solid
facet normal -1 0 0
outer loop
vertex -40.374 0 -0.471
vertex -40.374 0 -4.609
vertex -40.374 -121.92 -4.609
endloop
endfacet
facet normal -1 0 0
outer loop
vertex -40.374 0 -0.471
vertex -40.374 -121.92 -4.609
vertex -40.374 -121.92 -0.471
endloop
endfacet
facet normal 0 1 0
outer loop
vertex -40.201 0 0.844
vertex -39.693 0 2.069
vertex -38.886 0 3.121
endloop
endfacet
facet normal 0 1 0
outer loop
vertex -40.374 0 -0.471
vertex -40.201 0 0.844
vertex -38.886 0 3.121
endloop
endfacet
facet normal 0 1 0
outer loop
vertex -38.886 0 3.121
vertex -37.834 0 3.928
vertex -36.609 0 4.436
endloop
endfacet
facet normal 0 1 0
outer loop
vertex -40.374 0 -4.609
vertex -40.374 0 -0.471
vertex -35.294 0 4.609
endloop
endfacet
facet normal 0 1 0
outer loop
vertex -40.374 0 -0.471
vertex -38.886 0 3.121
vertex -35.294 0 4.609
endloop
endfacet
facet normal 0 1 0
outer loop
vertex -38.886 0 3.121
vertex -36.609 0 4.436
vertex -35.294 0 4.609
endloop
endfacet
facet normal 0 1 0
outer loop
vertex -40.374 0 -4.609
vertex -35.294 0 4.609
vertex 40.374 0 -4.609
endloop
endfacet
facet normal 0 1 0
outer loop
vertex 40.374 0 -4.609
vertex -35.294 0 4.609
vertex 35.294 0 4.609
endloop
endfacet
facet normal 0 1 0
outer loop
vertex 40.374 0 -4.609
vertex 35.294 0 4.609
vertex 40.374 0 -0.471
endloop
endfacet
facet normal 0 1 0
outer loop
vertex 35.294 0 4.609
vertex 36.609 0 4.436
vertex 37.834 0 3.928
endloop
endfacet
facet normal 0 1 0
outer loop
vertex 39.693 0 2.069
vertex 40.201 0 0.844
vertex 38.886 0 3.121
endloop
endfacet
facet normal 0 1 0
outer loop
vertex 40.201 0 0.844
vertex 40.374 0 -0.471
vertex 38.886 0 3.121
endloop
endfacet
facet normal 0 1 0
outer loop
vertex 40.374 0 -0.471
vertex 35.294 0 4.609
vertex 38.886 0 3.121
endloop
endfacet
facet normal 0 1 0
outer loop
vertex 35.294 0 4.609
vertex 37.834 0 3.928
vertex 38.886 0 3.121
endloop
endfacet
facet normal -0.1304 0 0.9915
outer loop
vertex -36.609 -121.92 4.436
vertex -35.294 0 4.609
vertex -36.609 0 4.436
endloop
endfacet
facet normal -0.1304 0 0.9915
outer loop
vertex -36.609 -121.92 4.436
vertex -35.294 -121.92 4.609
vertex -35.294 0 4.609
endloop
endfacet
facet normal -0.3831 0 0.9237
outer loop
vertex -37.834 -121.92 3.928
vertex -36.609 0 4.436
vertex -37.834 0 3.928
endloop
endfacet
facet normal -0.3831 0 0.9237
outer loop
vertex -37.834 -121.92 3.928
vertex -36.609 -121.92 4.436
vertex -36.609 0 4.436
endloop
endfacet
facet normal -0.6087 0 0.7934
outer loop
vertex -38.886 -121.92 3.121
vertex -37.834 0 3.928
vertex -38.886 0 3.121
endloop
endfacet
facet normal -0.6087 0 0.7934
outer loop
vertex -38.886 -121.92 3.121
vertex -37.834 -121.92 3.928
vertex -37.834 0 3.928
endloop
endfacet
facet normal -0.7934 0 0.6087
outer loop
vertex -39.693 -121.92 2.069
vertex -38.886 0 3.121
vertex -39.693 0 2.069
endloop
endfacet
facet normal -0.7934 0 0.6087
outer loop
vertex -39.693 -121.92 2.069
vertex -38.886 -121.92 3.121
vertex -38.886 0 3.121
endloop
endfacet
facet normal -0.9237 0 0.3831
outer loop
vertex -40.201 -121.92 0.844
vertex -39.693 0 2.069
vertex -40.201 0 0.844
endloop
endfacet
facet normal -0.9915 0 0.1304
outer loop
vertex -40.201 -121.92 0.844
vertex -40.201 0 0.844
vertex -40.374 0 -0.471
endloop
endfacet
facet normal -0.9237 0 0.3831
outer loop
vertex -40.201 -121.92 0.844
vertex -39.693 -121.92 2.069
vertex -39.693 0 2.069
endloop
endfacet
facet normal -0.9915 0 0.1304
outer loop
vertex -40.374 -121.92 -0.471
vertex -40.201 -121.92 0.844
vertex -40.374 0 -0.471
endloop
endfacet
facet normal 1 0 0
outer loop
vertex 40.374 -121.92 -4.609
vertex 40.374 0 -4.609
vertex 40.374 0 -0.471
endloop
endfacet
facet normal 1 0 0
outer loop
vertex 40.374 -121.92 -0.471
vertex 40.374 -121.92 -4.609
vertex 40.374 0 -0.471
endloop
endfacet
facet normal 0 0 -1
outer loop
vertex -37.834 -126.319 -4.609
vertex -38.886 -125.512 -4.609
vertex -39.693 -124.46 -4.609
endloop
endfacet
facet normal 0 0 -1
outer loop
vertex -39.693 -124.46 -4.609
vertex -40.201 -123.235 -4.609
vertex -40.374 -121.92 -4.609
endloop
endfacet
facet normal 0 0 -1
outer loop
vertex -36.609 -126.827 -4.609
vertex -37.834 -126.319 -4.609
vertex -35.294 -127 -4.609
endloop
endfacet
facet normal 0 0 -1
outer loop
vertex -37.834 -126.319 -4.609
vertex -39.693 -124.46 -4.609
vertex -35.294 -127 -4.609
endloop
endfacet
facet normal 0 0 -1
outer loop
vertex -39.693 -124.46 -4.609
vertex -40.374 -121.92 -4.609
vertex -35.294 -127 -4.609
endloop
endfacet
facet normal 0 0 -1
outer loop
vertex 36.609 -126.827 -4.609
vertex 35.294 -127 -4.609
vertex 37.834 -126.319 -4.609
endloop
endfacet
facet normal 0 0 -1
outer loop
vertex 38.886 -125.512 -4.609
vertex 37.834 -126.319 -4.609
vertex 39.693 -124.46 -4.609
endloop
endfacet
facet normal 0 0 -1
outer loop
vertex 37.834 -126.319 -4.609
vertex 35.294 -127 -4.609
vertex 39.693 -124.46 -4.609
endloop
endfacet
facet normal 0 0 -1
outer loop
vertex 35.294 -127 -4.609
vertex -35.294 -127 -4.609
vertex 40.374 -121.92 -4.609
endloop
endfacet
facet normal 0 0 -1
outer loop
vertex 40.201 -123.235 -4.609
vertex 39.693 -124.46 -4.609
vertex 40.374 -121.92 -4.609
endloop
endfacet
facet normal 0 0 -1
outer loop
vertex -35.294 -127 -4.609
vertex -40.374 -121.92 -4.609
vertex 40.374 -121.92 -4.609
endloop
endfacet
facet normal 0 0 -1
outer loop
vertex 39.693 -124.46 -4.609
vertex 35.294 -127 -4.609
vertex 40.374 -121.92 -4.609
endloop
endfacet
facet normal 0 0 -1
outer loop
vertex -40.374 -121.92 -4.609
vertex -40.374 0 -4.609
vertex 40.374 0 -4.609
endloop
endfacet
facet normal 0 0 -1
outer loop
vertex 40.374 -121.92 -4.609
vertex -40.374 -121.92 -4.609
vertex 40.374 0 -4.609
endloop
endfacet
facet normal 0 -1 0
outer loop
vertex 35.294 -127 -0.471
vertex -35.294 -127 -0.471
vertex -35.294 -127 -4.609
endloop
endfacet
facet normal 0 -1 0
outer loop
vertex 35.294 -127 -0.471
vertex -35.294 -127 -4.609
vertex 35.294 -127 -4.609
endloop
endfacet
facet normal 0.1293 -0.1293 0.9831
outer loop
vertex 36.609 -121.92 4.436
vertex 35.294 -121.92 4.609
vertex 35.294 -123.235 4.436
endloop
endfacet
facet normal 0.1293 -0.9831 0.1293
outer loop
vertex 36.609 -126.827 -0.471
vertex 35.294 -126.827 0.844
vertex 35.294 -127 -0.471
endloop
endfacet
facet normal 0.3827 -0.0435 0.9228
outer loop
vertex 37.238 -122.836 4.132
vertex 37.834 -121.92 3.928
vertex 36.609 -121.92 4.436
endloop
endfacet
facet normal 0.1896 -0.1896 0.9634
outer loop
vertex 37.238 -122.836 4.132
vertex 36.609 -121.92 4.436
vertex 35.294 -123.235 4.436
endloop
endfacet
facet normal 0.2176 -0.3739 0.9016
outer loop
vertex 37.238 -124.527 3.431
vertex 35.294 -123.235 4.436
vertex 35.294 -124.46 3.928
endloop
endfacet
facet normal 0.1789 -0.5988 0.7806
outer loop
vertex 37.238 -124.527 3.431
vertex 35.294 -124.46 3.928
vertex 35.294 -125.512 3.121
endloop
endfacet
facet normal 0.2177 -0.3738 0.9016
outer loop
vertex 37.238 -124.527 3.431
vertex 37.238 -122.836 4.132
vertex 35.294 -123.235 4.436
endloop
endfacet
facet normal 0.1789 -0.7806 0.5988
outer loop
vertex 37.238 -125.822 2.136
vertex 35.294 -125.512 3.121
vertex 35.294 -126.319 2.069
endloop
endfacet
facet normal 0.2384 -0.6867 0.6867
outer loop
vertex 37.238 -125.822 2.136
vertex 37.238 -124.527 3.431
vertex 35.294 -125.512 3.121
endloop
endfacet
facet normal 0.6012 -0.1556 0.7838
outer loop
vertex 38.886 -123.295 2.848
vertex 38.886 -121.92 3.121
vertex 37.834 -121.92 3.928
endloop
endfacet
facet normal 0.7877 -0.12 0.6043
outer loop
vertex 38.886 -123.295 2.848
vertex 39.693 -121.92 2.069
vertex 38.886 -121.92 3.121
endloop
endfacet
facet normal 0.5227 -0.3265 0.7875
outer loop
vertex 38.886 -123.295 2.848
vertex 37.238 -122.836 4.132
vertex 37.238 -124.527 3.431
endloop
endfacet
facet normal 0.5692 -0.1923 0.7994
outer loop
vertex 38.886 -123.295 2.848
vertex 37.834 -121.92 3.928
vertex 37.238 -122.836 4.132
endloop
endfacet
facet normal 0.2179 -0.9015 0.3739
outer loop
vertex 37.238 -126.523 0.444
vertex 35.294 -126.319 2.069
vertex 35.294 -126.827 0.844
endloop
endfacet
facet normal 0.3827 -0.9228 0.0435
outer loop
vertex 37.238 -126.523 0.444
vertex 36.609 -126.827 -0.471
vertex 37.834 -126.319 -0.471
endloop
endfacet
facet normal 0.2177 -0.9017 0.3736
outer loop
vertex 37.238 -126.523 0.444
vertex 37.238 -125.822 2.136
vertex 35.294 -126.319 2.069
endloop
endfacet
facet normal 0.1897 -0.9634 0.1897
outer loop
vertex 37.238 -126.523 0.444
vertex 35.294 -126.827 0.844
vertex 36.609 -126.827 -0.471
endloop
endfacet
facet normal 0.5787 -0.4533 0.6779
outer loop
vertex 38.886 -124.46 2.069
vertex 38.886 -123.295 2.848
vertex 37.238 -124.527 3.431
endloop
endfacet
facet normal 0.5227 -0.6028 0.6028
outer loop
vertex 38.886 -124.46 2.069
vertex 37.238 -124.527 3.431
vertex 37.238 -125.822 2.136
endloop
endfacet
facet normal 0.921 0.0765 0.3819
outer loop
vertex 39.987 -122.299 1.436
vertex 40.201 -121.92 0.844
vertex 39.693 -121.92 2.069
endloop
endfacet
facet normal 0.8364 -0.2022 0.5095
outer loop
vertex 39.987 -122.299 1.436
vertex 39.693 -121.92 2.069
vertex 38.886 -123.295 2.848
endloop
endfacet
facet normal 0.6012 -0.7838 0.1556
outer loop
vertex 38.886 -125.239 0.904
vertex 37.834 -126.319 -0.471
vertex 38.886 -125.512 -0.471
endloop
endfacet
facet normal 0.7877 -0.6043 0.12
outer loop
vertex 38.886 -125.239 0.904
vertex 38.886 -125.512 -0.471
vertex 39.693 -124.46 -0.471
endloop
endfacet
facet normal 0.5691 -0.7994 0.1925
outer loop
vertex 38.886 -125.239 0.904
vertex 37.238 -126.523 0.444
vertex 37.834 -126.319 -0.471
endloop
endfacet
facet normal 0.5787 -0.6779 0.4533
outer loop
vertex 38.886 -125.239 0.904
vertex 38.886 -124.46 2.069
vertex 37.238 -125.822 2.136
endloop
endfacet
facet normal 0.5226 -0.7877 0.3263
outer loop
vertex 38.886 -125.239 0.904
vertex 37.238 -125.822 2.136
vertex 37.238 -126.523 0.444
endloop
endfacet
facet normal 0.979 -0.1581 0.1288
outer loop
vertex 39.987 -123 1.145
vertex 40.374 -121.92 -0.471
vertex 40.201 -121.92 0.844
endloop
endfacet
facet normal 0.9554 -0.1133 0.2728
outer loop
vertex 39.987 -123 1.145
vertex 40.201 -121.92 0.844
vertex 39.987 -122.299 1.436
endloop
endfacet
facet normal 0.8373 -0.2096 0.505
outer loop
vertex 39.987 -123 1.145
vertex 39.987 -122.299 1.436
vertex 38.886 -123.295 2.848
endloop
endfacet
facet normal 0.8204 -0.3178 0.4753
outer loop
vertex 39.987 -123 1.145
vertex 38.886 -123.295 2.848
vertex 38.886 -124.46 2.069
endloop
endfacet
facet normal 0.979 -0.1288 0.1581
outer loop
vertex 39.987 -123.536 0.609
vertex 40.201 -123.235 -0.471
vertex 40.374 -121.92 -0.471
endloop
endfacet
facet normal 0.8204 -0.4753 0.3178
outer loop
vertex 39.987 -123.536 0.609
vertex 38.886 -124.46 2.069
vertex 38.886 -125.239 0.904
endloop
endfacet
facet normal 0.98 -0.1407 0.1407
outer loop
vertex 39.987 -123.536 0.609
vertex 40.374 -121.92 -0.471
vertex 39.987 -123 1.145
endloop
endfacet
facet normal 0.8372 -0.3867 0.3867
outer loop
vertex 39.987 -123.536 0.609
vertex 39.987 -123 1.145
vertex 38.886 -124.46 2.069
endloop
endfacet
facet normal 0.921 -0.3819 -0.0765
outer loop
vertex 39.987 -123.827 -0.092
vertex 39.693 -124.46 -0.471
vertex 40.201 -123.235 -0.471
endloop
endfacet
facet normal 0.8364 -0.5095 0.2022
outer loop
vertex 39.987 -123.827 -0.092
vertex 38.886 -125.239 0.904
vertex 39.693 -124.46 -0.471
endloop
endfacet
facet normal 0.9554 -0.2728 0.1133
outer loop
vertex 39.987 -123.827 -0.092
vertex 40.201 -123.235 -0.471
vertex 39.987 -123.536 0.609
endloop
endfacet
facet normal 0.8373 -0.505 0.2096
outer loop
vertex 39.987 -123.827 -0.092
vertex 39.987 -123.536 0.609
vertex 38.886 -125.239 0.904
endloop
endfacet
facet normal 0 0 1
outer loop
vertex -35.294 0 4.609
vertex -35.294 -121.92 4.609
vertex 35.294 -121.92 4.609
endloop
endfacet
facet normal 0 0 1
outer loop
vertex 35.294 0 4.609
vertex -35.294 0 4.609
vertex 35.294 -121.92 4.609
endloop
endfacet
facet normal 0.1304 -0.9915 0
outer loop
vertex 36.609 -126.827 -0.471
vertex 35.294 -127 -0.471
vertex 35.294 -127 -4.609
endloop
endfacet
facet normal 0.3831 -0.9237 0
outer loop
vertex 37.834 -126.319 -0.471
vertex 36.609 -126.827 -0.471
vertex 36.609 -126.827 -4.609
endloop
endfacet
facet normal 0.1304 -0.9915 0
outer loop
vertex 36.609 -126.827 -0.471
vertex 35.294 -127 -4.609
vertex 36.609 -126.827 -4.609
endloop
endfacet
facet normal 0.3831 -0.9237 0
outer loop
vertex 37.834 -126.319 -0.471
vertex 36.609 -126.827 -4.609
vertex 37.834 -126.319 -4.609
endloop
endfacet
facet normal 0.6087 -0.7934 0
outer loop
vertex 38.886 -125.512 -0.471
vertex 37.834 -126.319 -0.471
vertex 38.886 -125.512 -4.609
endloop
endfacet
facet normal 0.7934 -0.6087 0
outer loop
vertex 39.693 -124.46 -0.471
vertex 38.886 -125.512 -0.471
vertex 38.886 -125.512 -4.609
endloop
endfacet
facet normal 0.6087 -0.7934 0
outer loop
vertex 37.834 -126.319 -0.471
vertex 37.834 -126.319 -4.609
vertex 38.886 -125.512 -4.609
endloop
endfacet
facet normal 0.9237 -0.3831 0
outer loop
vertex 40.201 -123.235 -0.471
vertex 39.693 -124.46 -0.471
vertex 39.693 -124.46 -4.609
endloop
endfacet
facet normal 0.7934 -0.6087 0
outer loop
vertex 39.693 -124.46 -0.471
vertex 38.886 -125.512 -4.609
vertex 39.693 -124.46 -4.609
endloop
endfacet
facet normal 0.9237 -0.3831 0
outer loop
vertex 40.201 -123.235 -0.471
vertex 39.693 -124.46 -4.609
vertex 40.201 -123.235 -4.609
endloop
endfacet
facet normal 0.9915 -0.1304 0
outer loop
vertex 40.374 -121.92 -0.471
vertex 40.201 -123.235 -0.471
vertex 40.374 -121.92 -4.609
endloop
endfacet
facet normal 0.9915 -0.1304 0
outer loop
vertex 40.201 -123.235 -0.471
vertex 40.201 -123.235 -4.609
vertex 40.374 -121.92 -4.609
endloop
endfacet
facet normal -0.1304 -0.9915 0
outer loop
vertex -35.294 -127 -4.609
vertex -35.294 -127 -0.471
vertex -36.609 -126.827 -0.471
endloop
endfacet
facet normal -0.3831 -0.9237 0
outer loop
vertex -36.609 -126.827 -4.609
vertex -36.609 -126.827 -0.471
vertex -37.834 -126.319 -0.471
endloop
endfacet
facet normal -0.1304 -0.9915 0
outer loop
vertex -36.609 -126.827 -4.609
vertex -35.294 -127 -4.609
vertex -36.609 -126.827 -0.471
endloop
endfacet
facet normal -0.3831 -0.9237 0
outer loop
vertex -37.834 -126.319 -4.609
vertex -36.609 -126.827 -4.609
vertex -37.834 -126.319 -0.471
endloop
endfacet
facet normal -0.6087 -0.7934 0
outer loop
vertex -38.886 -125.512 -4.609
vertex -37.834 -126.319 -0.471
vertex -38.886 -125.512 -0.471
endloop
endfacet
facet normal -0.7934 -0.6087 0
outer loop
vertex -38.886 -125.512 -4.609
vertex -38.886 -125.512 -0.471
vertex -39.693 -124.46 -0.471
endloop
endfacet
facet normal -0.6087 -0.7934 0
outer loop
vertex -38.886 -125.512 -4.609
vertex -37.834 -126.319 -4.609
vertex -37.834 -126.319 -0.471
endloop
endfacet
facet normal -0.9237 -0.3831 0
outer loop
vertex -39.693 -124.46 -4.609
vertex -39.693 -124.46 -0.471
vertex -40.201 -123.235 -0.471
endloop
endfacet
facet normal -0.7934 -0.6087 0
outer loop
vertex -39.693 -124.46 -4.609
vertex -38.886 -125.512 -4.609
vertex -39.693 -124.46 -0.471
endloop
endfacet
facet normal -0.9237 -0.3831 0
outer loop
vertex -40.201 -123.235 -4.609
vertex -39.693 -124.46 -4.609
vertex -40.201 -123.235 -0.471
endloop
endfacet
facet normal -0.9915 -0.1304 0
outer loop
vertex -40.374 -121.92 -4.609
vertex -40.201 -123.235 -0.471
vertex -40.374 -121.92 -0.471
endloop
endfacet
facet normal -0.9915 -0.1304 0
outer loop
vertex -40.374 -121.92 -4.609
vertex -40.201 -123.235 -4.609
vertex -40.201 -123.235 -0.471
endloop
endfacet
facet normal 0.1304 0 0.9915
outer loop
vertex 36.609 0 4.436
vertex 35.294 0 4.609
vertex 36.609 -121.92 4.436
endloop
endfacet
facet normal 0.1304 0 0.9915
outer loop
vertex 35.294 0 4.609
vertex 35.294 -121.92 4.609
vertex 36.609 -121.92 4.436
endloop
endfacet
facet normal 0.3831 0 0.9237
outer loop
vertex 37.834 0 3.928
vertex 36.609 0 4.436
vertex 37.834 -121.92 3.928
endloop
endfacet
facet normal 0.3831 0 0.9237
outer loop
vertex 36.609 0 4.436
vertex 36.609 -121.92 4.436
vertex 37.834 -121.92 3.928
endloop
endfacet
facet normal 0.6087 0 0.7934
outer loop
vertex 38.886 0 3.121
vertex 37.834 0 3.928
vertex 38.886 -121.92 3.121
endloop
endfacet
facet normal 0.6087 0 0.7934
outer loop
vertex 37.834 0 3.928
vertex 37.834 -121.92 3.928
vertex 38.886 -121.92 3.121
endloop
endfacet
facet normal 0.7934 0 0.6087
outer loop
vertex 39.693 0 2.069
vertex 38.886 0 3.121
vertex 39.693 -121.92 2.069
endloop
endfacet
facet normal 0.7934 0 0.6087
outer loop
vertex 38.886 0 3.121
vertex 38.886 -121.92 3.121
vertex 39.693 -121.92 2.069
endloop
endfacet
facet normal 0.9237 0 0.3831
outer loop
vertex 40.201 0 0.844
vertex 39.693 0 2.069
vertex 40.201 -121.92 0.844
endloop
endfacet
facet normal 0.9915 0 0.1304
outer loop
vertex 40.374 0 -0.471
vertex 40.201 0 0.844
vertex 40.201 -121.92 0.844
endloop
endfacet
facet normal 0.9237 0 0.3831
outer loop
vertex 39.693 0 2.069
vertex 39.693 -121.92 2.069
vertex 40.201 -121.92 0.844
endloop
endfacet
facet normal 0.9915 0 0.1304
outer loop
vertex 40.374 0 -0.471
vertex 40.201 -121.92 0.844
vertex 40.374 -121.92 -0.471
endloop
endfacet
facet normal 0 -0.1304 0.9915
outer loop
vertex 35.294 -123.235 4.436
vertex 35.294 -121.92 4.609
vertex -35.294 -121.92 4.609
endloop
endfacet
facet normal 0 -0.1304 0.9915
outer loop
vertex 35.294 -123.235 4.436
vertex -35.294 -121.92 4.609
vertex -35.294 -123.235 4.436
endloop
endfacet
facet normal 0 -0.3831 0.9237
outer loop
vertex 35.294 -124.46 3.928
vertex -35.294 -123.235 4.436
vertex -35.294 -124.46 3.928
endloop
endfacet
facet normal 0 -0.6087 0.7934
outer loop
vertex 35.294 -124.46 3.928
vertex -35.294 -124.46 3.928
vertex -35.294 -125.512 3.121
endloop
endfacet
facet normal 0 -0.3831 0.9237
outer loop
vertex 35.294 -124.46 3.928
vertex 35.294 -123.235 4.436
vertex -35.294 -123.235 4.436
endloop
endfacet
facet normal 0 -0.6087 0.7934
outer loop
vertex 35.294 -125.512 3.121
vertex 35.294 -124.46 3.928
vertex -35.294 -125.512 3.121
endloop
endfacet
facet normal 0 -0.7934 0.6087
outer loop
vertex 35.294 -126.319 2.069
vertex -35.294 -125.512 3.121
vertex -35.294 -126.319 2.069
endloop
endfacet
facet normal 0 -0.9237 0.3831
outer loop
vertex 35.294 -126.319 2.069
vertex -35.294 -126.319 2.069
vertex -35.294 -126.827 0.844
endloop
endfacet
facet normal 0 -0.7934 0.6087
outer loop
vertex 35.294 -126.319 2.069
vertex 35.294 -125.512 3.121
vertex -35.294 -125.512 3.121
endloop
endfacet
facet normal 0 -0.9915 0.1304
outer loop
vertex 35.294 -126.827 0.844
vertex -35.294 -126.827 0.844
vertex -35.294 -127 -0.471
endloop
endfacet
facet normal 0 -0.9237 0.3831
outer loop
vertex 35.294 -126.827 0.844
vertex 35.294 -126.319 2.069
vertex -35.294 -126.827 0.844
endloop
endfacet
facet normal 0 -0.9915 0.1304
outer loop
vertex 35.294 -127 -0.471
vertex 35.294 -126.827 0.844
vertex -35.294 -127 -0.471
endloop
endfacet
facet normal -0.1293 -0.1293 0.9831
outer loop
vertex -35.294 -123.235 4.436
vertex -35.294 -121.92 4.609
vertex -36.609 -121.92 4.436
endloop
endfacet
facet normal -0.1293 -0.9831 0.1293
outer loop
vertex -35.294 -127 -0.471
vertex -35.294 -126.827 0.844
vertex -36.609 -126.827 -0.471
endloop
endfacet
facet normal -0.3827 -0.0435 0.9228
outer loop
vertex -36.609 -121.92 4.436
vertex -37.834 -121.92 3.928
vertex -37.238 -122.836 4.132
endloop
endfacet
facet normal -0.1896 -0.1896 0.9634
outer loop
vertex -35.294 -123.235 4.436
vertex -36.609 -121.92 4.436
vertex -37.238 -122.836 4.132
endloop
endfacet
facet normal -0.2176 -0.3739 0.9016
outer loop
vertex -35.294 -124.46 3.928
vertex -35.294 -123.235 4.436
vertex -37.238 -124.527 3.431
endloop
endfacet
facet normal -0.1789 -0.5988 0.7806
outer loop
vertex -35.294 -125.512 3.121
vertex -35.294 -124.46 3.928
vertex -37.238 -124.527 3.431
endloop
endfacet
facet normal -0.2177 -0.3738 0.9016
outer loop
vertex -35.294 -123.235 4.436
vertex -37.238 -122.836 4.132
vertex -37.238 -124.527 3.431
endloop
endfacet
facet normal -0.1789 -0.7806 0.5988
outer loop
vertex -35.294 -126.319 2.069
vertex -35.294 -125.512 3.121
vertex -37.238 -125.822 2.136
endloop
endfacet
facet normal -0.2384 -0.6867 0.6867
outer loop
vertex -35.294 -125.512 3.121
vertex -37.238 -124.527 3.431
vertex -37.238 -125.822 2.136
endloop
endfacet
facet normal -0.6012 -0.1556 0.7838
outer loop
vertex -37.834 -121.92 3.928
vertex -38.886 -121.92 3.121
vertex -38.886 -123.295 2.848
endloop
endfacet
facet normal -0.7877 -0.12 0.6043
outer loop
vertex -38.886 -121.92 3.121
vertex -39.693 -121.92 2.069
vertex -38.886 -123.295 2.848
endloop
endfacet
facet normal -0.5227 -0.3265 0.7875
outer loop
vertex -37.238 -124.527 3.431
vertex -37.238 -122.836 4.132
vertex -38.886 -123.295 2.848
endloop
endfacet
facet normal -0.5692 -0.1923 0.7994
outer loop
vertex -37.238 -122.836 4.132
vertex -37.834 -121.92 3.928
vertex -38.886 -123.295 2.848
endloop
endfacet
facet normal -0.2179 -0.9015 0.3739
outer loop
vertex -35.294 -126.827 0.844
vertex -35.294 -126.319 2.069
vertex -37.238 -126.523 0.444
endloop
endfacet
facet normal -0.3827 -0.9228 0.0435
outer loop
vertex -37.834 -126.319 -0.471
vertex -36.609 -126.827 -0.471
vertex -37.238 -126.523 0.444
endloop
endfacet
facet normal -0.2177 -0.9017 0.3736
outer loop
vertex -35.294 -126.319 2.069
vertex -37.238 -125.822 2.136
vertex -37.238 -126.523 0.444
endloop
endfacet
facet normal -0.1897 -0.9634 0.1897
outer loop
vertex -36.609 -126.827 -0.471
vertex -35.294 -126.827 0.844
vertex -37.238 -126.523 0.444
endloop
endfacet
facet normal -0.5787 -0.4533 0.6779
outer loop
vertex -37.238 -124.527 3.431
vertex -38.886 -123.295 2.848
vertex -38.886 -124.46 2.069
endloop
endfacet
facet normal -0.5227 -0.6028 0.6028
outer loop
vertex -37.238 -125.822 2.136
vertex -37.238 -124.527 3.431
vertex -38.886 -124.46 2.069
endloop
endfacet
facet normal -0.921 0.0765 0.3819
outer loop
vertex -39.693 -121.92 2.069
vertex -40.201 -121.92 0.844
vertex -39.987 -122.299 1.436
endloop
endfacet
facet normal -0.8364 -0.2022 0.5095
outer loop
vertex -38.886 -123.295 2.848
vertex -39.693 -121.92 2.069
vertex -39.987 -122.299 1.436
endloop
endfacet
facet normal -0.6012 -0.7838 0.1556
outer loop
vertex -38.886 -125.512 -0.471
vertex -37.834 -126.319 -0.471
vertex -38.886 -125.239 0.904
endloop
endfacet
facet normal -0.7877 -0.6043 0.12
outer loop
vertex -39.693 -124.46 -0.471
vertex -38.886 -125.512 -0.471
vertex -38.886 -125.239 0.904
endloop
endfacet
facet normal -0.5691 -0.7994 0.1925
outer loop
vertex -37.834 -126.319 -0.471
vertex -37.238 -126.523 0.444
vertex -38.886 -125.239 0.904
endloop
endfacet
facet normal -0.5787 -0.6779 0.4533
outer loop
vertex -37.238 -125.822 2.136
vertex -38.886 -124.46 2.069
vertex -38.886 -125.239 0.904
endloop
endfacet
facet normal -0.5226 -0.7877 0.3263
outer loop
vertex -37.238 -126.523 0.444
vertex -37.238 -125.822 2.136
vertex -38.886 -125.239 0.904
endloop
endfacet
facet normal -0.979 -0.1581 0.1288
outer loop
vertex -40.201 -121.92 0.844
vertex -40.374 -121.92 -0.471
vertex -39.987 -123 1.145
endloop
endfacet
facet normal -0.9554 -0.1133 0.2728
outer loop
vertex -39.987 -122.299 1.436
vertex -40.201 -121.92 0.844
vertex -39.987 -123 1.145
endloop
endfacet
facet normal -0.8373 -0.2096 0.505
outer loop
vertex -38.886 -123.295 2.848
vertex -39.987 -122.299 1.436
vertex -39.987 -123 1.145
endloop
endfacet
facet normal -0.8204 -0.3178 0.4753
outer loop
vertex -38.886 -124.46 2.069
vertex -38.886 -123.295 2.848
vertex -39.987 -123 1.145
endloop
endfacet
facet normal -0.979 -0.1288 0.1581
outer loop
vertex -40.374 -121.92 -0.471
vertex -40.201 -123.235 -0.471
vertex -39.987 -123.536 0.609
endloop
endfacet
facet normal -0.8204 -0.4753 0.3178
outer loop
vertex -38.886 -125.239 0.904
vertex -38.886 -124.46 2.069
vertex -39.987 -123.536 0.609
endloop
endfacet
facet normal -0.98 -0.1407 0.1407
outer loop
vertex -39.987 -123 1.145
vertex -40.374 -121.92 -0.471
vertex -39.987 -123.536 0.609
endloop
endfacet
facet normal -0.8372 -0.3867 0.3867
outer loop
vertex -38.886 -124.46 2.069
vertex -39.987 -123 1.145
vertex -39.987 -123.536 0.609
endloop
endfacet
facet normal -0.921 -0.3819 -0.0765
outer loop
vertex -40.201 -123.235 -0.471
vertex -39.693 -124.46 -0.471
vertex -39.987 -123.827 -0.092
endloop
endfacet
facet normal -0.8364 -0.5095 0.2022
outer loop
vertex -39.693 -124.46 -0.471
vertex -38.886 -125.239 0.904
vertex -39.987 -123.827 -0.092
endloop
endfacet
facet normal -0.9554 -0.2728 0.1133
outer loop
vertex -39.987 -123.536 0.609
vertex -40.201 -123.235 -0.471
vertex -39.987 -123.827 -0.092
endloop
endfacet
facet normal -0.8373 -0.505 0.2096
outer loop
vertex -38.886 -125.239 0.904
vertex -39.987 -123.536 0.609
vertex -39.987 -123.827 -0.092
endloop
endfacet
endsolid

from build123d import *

# Parameters (mm, degrees)
F0_W     = 80.747418
F0_H     = 9.217742
F1_DEPTH = 127
F2_R     = 5.08
F3_R     = 5.08
F4_R     = 5.08


with BuildPart() as f1:
    # F0 (on Front) → F1 (new body)
    with BuildSketch(Plane.XZ):
        Rectangle(F0_W, F0_H)
    extrude(amount=F1_DEPTH)

    # F2
    f2_edges = [f1.edges().sort_by_distance(p)[0] for p in [
        (0, -127, 4.608871),
    ]]
    fillet(f2_edges, radius=F2_R)

    # F3
    f3_edges = [f1.edges().sort_by_distance(p)[0] for p in [
        (40.373709, -60.96, 4.608871),
    ]]
    fillet(f3_edges, radius=F3_R)

    # F4
    f4_edges = [f1.edges().sort_by_distance(p)[0] for p in [
        (-40.373709, -60.96, 4.608871),
    ]]
    fillet(f4_edges, radius=F4_R)


solid = f1.part
